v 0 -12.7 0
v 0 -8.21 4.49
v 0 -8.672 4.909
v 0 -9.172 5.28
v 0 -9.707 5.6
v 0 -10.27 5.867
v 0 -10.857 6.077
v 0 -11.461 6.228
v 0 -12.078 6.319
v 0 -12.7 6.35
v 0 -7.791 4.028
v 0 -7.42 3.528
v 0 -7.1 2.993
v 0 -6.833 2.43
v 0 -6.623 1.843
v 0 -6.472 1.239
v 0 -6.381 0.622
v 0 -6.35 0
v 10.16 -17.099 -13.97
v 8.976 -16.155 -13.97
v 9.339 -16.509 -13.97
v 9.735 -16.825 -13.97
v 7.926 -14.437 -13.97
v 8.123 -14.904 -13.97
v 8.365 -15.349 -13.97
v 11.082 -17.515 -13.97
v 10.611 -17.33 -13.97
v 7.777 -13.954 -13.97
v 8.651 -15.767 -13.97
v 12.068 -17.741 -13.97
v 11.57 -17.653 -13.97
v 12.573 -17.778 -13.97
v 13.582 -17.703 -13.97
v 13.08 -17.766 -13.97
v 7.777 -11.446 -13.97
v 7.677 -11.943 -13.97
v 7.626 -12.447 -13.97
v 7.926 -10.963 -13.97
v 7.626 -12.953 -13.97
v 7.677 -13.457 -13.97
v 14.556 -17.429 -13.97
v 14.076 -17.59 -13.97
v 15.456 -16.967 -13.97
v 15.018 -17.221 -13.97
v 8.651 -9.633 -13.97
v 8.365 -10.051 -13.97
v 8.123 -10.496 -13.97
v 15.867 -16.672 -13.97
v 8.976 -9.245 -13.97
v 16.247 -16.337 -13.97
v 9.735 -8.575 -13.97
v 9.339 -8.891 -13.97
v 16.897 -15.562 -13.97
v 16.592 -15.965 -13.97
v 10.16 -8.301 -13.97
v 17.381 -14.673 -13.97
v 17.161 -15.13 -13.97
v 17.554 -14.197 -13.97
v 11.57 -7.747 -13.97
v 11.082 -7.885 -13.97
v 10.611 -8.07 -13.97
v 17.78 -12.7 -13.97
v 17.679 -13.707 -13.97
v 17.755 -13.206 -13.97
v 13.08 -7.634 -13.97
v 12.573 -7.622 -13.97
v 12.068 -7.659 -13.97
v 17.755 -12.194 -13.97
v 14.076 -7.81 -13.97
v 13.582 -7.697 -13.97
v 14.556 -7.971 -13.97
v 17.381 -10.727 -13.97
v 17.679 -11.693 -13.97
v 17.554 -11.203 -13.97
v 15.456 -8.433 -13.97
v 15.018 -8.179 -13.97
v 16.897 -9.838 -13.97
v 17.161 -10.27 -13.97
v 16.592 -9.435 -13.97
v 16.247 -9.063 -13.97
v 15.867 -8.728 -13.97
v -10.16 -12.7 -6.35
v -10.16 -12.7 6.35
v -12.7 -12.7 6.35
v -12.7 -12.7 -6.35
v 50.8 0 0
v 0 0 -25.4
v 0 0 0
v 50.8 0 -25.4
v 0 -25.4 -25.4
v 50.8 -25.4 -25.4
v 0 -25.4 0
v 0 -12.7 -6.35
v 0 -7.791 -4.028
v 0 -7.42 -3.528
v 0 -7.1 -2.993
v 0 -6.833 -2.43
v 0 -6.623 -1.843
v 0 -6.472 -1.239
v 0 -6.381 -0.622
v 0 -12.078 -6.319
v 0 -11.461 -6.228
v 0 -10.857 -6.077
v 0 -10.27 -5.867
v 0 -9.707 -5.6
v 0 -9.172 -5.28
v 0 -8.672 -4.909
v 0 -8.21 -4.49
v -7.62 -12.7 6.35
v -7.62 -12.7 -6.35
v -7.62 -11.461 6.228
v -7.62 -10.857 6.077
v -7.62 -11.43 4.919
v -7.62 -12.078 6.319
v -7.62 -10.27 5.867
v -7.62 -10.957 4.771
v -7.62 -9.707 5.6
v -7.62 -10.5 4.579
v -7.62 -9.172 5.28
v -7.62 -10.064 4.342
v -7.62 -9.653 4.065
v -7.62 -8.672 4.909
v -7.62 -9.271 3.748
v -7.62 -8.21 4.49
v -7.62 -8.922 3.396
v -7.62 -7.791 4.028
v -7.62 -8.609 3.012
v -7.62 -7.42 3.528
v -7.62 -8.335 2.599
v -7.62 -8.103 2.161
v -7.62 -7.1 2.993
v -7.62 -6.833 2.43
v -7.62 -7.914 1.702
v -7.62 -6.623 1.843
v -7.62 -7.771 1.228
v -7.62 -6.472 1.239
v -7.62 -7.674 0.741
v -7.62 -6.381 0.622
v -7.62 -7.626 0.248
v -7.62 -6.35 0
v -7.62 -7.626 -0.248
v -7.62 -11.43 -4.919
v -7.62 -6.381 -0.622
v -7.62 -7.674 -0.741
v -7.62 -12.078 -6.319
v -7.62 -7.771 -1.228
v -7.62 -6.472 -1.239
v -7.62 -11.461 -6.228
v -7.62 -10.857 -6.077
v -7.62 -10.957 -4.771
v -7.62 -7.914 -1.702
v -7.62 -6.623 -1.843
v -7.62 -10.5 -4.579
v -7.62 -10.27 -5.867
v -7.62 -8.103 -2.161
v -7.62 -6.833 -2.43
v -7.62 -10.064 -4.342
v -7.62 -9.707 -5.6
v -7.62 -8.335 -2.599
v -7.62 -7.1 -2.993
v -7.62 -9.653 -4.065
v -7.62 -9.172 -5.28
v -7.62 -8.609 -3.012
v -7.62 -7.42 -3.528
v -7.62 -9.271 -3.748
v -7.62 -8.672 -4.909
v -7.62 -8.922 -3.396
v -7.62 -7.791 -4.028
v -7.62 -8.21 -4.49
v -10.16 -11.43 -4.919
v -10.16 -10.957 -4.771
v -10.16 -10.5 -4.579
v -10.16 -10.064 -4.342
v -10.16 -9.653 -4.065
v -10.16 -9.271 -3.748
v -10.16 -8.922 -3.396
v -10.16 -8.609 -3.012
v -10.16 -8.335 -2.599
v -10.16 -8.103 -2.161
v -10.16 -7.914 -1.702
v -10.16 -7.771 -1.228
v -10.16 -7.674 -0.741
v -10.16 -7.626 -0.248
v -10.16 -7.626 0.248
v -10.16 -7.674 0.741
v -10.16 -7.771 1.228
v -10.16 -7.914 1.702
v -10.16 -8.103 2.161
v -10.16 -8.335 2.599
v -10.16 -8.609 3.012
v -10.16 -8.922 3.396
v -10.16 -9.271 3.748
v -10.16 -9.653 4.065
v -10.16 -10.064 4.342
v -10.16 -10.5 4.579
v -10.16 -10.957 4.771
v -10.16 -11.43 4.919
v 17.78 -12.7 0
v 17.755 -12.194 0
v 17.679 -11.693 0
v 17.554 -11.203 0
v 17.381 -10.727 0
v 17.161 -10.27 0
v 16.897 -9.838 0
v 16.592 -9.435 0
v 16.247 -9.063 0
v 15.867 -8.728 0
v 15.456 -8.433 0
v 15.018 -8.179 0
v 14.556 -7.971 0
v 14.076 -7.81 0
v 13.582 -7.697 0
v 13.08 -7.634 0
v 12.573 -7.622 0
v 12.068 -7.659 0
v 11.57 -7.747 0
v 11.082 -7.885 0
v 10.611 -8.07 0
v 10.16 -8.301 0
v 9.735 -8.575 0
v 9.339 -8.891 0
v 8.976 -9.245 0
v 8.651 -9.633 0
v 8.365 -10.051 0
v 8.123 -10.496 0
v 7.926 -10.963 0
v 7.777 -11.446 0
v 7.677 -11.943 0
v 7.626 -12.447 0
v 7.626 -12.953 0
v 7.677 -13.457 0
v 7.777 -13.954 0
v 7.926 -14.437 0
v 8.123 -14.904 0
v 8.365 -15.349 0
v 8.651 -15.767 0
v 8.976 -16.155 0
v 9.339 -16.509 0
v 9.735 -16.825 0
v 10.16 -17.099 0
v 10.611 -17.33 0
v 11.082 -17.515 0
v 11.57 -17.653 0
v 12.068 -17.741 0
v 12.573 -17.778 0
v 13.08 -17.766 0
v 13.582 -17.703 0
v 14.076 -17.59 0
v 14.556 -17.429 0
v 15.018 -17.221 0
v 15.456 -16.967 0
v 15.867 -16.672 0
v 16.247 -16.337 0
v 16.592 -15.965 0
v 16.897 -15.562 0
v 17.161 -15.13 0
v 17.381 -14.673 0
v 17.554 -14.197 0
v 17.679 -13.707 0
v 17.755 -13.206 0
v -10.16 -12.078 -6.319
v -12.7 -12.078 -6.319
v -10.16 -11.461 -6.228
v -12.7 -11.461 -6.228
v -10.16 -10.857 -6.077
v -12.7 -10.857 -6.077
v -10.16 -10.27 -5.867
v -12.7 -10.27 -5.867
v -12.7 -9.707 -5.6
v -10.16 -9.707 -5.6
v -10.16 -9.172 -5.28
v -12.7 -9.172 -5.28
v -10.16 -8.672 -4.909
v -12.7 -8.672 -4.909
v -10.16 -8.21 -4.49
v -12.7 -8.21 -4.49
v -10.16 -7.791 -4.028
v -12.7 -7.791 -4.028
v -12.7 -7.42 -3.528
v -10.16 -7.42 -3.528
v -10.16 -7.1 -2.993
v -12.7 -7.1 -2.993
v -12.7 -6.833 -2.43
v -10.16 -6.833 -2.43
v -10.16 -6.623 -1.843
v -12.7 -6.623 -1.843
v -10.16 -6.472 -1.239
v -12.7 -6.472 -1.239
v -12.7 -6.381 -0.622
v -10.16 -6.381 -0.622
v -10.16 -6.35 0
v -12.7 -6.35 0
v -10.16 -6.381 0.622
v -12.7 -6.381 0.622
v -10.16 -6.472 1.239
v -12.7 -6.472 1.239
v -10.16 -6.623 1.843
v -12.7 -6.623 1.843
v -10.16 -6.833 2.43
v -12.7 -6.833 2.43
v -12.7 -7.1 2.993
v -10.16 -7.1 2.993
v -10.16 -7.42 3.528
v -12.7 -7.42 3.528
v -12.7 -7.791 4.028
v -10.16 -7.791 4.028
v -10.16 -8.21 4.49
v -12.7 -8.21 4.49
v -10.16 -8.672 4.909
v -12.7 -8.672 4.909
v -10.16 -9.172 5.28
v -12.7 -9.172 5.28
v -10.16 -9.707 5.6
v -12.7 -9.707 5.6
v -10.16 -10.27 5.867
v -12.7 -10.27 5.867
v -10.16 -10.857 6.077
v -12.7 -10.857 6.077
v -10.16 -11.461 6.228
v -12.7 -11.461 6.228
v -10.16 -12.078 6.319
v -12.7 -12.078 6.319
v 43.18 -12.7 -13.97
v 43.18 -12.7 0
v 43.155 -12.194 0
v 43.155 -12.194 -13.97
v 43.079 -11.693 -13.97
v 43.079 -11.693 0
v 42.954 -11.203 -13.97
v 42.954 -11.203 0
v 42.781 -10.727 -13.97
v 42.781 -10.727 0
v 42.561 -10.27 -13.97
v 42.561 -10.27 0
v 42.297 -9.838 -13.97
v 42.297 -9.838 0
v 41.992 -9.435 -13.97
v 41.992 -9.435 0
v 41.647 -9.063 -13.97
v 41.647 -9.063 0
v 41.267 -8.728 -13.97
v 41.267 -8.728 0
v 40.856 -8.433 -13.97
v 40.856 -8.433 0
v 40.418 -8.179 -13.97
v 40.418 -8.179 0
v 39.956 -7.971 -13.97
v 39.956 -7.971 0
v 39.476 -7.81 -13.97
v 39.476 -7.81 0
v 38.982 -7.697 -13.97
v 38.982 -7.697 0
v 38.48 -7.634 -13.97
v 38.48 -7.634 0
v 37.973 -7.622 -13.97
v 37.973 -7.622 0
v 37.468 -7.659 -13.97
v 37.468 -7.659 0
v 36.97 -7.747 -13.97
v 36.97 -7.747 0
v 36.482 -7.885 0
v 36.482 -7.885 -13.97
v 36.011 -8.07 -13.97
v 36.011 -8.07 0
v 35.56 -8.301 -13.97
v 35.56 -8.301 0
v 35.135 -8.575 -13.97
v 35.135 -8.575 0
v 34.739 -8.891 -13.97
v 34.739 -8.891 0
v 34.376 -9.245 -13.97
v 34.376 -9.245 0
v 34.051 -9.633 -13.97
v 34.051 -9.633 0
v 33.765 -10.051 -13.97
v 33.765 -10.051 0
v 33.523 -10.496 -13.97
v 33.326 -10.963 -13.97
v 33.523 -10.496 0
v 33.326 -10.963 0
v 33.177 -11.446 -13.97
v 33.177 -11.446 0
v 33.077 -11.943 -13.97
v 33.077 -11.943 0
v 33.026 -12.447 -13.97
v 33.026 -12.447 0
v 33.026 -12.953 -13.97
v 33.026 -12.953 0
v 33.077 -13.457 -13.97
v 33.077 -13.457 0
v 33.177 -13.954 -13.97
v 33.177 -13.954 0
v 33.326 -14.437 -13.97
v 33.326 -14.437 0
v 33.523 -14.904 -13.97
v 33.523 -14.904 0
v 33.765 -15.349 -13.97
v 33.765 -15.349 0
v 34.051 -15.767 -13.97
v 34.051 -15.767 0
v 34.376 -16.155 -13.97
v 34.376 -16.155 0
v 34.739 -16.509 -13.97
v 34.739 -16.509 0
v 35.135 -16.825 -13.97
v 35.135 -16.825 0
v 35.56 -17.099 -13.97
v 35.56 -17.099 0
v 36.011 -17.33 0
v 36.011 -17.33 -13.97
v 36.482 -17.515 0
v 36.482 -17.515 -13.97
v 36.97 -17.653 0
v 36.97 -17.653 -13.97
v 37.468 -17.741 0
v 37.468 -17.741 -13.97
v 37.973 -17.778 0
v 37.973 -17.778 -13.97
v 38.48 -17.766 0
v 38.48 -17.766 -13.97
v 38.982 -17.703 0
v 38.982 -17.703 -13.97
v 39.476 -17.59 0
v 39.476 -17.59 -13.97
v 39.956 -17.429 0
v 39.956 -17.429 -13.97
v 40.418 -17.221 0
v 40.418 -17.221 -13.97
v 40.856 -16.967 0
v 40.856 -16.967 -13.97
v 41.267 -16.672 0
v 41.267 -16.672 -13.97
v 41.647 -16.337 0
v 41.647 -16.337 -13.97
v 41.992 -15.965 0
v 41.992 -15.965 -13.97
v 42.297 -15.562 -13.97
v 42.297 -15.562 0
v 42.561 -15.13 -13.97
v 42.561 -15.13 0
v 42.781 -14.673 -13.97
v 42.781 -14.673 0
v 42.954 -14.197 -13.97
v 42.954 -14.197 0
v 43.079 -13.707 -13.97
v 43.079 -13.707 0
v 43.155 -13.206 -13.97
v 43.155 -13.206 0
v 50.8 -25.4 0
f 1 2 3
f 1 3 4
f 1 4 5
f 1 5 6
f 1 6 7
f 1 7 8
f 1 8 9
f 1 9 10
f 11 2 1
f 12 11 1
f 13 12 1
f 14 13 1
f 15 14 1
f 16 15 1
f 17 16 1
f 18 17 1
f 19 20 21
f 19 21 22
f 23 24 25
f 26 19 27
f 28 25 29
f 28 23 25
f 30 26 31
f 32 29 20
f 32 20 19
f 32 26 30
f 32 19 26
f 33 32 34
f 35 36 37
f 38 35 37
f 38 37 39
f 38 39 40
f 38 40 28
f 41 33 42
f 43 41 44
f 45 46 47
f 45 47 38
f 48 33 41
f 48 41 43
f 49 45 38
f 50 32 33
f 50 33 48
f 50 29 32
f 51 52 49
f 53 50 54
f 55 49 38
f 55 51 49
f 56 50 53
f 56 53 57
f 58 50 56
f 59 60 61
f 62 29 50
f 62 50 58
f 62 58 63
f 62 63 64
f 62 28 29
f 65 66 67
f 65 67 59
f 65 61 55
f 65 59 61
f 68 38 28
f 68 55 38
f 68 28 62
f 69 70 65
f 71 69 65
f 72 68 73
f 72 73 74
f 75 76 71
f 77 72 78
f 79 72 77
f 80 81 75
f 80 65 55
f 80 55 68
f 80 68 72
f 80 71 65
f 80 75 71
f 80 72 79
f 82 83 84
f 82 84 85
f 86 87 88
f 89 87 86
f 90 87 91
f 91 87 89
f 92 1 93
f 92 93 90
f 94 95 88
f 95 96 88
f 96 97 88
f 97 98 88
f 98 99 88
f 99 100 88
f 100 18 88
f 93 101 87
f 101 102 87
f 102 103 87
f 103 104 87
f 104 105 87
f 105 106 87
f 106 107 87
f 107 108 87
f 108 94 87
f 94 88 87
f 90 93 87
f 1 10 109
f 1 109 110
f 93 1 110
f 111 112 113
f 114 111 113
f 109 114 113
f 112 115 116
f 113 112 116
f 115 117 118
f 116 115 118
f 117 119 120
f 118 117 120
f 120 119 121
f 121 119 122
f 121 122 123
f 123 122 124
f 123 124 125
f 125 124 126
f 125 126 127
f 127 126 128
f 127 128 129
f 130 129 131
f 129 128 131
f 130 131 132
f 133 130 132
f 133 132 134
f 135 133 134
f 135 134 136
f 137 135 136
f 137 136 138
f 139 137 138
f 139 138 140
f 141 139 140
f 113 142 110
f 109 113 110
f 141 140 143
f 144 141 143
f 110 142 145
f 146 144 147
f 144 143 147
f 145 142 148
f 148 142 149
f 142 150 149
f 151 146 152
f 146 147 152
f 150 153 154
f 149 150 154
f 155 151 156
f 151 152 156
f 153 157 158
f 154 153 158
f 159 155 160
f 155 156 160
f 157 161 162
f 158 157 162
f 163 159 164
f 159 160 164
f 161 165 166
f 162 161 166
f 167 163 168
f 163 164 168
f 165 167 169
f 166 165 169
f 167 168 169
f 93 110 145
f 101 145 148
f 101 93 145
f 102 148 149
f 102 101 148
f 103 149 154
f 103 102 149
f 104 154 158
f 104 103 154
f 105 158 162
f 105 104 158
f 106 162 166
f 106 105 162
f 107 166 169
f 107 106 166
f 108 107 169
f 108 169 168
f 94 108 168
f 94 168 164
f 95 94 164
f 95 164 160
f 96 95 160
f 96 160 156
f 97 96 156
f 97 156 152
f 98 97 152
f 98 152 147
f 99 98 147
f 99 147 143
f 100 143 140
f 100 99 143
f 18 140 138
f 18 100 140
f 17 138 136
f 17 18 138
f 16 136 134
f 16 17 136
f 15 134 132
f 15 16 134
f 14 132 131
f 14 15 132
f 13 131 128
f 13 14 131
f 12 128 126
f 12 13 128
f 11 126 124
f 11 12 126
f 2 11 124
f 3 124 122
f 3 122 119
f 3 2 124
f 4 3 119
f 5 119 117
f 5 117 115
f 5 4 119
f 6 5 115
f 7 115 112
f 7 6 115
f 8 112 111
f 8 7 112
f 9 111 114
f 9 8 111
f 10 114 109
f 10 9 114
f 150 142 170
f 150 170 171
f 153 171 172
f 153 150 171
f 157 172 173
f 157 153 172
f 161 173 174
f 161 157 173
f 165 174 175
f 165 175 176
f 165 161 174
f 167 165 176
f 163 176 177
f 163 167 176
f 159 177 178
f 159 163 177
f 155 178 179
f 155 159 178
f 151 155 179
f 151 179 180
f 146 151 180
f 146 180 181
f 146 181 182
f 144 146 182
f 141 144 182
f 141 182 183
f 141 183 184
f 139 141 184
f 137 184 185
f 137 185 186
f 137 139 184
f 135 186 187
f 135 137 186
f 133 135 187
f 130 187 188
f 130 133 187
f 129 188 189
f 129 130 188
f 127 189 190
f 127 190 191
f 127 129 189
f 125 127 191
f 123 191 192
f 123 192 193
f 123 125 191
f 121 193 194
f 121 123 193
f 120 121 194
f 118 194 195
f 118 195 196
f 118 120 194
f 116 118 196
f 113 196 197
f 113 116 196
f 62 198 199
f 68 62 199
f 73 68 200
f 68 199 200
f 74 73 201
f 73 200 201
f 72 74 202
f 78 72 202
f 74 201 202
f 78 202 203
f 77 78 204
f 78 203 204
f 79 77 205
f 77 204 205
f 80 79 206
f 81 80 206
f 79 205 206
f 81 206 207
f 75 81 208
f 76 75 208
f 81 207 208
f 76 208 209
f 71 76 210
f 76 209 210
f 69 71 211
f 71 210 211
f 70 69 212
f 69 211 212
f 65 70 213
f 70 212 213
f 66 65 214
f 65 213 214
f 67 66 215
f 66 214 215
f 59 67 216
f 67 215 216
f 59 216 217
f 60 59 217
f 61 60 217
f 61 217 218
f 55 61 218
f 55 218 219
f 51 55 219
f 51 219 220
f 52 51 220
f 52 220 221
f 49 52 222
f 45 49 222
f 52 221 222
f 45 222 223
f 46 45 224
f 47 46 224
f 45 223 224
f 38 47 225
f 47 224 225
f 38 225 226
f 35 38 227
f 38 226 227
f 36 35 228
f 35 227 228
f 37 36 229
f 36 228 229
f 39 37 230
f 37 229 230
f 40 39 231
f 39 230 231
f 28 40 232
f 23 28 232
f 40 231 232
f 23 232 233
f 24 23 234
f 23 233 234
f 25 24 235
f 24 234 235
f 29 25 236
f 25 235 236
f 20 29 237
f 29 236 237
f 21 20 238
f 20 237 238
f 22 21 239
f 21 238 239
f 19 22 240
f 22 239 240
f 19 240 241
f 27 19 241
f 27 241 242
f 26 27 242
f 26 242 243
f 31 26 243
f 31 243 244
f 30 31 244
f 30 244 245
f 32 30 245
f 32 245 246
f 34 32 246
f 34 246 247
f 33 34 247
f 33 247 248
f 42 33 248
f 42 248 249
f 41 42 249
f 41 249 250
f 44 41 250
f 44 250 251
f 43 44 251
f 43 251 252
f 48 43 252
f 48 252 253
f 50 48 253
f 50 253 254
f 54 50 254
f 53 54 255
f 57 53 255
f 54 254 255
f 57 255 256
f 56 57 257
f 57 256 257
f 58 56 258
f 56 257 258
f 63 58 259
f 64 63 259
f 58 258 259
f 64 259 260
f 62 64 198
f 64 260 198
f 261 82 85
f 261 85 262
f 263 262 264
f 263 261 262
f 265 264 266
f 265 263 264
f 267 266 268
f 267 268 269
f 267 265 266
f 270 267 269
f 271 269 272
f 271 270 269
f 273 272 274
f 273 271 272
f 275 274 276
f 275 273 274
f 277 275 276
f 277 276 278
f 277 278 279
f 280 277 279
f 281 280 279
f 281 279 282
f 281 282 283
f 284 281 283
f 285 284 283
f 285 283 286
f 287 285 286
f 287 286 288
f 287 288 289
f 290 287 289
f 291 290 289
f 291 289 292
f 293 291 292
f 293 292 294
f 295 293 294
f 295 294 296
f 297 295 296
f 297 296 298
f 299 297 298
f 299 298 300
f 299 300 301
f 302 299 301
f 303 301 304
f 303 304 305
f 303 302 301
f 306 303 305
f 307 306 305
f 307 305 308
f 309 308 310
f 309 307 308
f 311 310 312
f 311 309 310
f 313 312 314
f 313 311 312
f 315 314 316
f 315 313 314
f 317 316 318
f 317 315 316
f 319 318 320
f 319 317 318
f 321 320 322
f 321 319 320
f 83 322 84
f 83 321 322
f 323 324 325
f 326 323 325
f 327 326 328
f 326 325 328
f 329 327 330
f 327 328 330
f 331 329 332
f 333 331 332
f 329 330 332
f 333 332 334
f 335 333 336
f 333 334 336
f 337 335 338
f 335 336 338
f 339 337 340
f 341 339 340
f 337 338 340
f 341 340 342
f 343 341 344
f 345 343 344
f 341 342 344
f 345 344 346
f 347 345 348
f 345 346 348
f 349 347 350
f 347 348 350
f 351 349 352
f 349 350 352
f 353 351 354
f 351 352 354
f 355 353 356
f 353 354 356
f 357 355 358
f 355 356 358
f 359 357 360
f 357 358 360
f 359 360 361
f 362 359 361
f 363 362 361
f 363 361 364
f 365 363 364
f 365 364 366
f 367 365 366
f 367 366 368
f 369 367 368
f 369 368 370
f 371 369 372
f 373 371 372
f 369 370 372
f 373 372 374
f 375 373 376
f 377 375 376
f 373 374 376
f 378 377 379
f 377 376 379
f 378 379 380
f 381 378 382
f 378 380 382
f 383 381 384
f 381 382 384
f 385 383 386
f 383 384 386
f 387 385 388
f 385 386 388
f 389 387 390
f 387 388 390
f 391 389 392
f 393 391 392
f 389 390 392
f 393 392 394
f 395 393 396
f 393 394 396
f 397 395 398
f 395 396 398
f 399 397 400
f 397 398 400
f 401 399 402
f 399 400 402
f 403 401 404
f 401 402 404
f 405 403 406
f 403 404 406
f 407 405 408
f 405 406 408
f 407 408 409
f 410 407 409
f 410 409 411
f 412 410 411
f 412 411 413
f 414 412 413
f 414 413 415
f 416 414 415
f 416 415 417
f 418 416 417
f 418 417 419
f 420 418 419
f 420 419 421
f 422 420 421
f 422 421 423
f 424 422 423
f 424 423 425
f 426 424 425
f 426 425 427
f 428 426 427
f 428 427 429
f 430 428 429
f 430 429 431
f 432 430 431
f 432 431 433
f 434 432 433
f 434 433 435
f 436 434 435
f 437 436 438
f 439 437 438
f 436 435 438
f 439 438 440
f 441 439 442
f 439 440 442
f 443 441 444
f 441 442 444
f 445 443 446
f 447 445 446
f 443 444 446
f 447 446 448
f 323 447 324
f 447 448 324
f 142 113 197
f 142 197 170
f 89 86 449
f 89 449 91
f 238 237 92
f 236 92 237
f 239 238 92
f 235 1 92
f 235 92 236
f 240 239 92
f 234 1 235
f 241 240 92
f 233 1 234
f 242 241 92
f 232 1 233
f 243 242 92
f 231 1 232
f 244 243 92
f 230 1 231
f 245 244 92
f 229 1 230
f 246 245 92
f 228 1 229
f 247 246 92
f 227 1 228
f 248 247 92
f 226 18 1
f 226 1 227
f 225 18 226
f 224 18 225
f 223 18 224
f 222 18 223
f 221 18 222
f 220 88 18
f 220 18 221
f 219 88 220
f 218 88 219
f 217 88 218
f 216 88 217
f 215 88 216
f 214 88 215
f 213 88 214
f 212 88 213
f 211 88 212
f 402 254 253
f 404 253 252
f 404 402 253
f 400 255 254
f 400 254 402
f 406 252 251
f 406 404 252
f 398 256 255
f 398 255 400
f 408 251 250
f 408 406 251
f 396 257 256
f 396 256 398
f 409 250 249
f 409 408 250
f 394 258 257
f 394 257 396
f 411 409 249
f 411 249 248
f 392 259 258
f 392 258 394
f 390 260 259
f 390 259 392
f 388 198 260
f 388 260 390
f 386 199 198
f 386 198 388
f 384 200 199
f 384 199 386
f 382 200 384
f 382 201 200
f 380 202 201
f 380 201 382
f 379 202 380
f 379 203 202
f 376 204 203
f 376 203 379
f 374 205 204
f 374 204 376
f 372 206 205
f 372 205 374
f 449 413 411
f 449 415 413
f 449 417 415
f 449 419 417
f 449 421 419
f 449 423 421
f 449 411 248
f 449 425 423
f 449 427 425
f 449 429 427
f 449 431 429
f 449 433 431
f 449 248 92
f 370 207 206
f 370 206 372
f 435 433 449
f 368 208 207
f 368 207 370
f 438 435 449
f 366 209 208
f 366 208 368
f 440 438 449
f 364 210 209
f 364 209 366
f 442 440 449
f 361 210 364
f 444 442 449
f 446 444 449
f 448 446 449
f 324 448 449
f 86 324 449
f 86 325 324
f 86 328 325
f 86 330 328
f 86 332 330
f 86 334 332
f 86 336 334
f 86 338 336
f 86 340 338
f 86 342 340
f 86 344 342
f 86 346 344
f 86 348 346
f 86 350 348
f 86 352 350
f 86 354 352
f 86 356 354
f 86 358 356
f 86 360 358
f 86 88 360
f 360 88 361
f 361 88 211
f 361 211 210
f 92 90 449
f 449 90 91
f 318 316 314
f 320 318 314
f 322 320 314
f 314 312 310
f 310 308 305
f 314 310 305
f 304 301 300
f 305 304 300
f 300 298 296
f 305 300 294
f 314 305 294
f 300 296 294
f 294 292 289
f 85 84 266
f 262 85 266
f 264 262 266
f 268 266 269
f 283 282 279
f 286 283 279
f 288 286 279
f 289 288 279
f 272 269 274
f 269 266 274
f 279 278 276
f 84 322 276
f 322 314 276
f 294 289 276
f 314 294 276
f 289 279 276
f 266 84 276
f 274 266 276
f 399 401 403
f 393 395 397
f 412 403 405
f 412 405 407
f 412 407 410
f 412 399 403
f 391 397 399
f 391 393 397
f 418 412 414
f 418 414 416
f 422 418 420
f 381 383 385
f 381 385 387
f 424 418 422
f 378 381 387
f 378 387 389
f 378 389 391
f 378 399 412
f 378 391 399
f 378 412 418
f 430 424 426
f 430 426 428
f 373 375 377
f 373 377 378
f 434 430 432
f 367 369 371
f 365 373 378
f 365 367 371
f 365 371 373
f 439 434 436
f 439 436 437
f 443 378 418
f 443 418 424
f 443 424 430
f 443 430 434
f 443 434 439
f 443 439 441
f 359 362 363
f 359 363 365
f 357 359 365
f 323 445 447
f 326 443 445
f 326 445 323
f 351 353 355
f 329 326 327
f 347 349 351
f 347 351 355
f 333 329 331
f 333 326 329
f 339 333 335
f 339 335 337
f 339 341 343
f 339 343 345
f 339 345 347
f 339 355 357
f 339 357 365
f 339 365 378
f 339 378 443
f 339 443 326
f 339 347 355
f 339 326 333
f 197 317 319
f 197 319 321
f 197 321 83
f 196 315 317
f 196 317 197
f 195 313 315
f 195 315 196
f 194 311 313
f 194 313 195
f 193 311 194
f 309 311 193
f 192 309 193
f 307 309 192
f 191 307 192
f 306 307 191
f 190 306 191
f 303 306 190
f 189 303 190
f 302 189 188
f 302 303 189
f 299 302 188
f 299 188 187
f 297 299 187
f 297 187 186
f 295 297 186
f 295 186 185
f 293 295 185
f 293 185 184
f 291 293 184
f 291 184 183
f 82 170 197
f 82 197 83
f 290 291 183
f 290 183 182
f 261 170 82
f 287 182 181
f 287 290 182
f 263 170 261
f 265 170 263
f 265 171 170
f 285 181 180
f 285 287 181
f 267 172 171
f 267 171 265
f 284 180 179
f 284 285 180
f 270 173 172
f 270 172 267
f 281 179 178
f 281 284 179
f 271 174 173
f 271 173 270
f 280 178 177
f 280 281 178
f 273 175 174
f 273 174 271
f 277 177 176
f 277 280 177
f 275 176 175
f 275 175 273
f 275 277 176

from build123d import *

# Parameters (mm, degrees)
SKETCH1_W           = 50.8
SKETCH1_H           = 25.4
BOSS_EXTRUDE1_DEPTH = 25.4
SKETCH2_R           = 5.08
CUT_EXTRUDE1_DEPTH  = 13.97
BOSS_EXTRUDE2_DEPTH = 12.7
CUT_EXTRUDE3_START  = -7.62
CUT_EXTRUDE3_DEPTH  = 2.54


with BuildPart() as part:
    # Sketch1 → Boss-Extrude1 (new body)
    with BuildSketch(Plane(origin=(0, 0, 0), x_dir=(1, 0, 0), z_dir=(0, 1, 0))):
        with Locations((25.4, 12.7)):
            Rectangle(SKETCH1_W, SKETCH1_H)
    extrude(amount=-BOSS_EXTRUDE1_DEPTH)

    # Sketch2 → Cut-Extrude1 (cut)
    with BuildSketch(Plane.XY):
        with Locations((12.7, -12.7)):
            Circle(SKETCH2_R)
        with Locations((38.1, -12.7)):
            Circle(SKETCH2_R)
    extrude(amount=-CUT_EXTRUDE1_DEPTH, mode=Mode.SUBTRACT)

    # Sketch3 → Boss-Extrude2 (add)
    with BuildSketch(Plane(origin=(0, 0, 0), x_dir=(0, 0, -1), z_dir=(1, 0, 0))):
        with BuildLine():
            Line((-6.35, -12.7), (6.35, -12.7))
            ThreePointArc((6.35, -12.7), (0, -6.35), (-6.35, -12.7))
        make_face()
    extrude(amount=-BOSS_EXTRUDE2_DEPTH)

    # Sketch4 → Cut-Extrude3 (cut)
    with BuildSketch(Plane(origin=(0, 0, 0), x_dir=(0, 0, -1), z_dir=(1, 0, 0)).offset(CUT_EXTRUDE3_START)):
        with BuildLine():
            Line((-6.35, -12.7), (6.35, -12.7))
            ThreePointArc((6.35, -12.7), (0, -6.35), (-6.35, -12.7))
        make_face()
        with BuildLine():
            Line((-4.91868885, -11.43), (4.91868885, -11.43))
            ThreePointArc((4.91868885, -11.43), (0, -7.62), (-4.91868885, -11.43))
        make_face(mode=Mode.SUBTRACT)
    extrude(amount=-CUT_EXTRUDE3_DEPTH, mode=Mode.SUBTRACT)


solid = part.part
